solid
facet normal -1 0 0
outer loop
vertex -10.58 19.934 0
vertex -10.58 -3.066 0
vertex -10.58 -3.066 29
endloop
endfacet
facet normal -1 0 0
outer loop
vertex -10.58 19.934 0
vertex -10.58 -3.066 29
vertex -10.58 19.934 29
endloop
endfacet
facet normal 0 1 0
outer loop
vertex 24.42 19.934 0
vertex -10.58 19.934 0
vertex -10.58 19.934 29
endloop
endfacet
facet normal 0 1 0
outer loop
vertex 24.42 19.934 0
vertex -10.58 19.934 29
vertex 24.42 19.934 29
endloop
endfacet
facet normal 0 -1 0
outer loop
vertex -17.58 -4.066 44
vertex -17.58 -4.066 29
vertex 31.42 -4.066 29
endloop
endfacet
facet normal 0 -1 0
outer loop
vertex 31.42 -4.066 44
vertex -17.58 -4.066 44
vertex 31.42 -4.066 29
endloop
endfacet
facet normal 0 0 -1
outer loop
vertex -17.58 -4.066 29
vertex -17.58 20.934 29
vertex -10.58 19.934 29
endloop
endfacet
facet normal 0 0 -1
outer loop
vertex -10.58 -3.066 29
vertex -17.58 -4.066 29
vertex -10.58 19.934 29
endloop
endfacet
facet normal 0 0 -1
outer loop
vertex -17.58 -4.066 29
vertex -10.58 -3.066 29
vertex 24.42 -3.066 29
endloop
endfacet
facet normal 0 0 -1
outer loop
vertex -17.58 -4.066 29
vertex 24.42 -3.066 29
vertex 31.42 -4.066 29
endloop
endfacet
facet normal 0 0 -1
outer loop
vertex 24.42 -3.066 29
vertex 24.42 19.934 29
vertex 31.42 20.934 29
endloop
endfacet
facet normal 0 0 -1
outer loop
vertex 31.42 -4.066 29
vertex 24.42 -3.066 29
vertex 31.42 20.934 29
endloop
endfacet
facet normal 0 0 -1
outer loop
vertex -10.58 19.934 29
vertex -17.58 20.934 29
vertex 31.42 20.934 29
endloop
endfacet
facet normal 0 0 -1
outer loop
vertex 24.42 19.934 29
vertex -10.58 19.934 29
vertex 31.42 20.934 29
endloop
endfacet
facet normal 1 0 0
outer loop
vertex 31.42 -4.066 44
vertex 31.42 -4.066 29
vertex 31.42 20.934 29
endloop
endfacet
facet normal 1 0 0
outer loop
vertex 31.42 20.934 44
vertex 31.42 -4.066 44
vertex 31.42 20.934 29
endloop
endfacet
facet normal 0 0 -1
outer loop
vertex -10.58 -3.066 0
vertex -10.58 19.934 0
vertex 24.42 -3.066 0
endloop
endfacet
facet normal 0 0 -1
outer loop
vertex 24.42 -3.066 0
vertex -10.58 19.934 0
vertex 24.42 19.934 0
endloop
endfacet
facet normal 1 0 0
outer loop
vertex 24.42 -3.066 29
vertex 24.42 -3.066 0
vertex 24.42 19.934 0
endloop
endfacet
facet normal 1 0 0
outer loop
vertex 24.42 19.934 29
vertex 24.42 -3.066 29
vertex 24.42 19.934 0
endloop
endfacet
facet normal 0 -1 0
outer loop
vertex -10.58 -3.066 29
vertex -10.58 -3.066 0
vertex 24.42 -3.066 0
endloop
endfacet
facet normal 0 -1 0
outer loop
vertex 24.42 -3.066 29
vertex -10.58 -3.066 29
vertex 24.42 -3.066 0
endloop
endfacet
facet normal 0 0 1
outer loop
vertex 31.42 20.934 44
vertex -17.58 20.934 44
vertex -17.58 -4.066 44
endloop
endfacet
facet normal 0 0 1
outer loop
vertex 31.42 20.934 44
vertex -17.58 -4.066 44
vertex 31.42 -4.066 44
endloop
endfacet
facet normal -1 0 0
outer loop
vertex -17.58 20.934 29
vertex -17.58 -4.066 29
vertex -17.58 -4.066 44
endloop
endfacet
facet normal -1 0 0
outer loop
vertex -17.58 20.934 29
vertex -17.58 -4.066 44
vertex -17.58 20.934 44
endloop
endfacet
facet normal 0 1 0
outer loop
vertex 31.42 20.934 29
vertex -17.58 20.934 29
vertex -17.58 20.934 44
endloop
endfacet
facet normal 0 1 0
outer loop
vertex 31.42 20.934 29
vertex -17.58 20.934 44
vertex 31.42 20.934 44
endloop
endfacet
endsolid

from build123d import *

# Parameters (mm, degrees)
F0_W     = 35
F0_H     = 23
F1_DEPTH = 29
F2_W     = 49
F2_H     = 25
F2_W_2   = 35
F2_H_2   = 23
F3_DEPTH = 15


with BuildPart() as f1:
    # F0 (on Top) → F1 (new body)
    with BuildSketch(Plane.XY):
        with Locations((6.9202957675, 8.4343513213)):
            Rectangle(F0_W, F0_H)
    extrude(amount=F1_DEPTH)

    # F2 (on face) → F3 (join)
    with BuildSketch(Plane.XY.offset(29)):
        with Locations((6.9202957675, 8.4343513213)):
            Rectangle(F2_W, F2_H)
        with Locations((6.9202957675, 8.4343513213)):
            Rectangle(F2_W_2, F2_H_2, mode=Mode.SUBTRACT)
        with Locations((6.9202957675, 8.4343513213)):
            Rectangle(F2_W_2, F2_H_2)
    extrude(amount=F3_DEPTH)


solid = f1.part
